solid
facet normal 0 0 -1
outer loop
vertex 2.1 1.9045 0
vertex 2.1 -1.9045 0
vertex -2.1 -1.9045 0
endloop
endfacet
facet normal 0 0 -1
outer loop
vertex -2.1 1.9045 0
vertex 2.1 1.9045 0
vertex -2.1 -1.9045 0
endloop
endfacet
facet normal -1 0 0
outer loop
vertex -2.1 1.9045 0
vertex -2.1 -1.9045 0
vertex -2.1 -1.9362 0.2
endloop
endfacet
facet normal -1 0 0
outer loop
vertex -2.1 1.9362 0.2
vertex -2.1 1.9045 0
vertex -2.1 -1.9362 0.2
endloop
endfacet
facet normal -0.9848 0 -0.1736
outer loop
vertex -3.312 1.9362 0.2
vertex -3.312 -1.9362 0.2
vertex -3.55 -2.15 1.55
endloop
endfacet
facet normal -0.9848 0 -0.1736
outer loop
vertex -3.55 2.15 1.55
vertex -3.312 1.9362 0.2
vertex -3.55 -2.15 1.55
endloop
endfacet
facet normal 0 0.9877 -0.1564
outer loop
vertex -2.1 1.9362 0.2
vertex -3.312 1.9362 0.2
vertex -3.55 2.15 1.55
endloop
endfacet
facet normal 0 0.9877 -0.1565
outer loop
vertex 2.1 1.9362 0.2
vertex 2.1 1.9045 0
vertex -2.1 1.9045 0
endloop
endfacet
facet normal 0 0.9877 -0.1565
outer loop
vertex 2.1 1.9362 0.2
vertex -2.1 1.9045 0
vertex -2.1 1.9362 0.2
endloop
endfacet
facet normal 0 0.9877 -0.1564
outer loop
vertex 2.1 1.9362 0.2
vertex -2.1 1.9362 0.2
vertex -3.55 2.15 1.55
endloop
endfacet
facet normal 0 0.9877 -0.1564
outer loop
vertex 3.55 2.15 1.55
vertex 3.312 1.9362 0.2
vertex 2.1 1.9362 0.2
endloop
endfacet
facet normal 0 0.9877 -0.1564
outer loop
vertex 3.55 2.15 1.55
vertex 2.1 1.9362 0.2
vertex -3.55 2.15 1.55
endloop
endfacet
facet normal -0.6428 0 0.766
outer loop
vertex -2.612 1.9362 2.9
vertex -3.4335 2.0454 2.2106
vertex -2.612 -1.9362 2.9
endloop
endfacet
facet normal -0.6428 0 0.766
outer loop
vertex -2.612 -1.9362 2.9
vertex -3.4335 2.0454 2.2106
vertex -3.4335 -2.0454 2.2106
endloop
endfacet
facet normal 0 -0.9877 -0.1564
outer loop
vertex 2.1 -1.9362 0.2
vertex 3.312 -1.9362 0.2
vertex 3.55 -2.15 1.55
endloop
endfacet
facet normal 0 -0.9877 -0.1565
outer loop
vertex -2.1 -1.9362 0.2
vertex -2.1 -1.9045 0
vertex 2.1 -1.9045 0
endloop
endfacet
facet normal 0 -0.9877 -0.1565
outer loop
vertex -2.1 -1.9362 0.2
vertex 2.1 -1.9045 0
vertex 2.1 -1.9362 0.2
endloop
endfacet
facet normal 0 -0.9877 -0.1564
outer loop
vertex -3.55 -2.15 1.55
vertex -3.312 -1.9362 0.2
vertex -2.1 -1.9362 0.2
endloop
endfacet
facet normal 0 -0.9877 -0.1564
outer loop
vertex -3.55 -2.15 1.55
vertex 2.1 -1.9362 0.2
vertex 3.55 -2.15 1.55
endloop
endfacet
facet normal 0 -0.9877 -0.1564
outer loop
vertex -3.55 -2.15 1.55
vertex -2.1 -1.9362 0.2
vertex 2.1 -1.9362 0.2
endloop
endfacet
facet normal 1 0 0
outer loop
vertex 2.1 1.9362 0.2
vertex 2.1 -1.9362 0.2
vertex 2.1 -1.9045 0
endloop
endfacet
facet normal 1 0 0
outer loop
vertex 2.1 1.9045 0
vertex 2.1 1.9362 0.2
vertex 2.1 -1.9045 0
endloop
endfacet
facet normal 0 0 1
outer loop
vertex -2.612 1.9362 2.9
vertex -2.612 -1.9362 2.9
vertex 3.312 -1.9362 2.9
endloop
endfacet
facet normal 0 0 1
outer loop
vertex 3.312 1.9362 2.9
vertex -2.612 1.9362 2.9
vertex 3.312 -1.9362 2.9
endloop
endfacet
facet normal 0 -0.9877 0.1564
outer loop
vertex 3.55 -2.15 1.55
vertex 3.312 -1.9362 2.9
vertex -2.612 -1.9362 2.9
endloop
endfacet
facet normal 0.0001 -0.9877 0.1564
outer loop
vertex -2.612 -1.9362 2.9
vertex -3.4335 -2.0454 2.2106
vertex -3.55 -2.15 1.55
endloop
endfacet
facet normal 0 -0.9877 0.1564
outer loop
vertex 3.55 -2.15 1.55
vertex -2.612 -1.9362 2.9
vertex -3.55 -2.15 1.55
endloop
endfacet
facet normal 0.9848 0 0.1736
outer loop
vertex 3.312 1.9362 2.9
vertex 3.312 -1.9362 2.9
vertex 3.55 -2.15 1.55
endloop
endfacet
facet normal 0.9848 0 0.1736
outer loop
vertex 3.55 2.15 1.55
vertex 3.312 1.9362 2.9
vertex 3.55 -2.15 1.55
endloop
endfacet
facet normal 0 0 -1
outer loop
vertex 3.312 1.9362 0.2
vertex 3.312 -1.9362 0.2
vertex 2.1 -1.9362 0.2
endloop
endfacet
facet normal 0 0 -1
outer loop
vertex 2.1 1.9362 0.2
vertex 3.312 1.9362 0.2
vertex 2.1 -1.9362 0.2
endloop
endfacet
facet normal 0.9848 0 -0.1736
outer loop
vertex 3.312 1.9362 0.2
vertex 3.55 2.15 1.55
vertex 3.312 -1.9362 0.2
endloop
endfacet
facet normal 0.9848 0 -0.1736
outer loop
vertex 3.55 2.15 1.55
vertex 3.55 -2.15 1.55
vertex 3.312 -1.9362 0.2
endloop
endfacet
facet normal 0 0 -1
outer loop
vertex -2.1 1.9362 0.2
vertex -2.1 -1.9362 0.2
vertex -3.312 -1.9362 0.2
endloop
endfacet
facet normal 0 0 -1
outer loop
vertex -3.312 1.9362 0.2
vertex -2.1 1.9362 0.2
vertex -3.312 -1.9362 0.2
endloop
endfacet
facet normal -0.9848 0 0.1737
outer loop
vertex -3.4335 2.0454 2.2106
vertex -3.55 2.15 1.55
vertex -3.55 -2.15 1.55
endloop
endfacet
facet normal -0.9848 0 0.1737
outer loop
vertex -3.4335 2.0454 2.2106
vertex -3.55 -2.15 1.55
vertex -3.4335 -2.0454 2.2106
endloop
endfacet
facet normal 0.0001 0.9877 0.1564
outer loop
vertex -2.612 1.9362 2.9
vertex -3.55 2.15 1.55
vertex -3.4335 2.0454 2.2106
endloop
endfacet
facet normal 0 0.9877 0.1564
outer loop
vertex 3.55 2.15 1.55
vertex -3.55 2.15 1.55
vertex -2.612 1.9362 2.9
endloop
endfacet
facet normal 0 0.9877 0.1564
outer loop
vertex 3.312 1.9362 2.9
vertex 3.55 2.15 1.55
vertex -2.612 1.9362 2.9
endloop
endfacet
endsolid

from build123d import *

# Parameters (mm, degrees)
PAD002_DEPTH    = 2.15
POCKET004_DEPTH = 10
POCKET005_DEPTH = 12.5
CHAMFER001_SIZE = 0.7


with BuildPart() as part:
    # Sketch011 → Pad002 (new body, symmetric)
    with BuildSketch(Plane.XZ):
        Polygon((-3.311958576, 2.9), (3.311958576, 2.9), (3.55, 1.55), (3.311958576, 0.2), (2.1, 0.2), (2.1, 0), (-2.1, 0), (-2.1, 0.2), (-3.311958576, 0.2), (-3.55, 1.55), align=None)
    extrude(amount=PAD002_DEPTH, both=True)

    # Sketch012 → Pocket004 (cut, symmetric)
    with BuildSketch(Plane(origin=(2.1, 0, 0), x_dir=(0, 0, 1), z_dir=(1, 0, 0))):
        Polygon((2.9220926693, 2.229851), (3.3067026402, 1.8717656945), (1.045841, 2.229851), align=None)
        Polygon((3.3067026402, -1.8717656945), (2.9220926693, -2.229851), (1.045841, -2.229851), align=None)
    extrude(amount=POCKET004_DEPTH, both=True, mode=Mode.SUBTRACT)

    # Sketch013 → Pocket005 (cut, symmetric)
    with BuildSketch(Plane(origin=(2.1, 0, 0), x_dir=(0, 0, 1), z_dir=(1, 0, 0))):
        Polygon((2.1937543082, 2.2519614985), (-0.4776096389, 2.2519614985), (-0.6097972306, 1.8079225571), align=None)
        Polygon((2.1937543082, -2.2519614985), (-0.4776096389, -2.2519614985), (-0.6097972306, -1.8079225571), align=None)
    extrude(amount=POCKET005_DEPTH, both=True, mode=Mode.SUBTRACT)

    # Chamfer001
    chamfer001_edges = [part.edges().sort_by_distance(p)[0] for p in [
        (-3.311959, 0, 2.9),
    ]]
    chamfer(chamfer001_edges, length=CHAMFER001_SIZE)


solid = part.part
